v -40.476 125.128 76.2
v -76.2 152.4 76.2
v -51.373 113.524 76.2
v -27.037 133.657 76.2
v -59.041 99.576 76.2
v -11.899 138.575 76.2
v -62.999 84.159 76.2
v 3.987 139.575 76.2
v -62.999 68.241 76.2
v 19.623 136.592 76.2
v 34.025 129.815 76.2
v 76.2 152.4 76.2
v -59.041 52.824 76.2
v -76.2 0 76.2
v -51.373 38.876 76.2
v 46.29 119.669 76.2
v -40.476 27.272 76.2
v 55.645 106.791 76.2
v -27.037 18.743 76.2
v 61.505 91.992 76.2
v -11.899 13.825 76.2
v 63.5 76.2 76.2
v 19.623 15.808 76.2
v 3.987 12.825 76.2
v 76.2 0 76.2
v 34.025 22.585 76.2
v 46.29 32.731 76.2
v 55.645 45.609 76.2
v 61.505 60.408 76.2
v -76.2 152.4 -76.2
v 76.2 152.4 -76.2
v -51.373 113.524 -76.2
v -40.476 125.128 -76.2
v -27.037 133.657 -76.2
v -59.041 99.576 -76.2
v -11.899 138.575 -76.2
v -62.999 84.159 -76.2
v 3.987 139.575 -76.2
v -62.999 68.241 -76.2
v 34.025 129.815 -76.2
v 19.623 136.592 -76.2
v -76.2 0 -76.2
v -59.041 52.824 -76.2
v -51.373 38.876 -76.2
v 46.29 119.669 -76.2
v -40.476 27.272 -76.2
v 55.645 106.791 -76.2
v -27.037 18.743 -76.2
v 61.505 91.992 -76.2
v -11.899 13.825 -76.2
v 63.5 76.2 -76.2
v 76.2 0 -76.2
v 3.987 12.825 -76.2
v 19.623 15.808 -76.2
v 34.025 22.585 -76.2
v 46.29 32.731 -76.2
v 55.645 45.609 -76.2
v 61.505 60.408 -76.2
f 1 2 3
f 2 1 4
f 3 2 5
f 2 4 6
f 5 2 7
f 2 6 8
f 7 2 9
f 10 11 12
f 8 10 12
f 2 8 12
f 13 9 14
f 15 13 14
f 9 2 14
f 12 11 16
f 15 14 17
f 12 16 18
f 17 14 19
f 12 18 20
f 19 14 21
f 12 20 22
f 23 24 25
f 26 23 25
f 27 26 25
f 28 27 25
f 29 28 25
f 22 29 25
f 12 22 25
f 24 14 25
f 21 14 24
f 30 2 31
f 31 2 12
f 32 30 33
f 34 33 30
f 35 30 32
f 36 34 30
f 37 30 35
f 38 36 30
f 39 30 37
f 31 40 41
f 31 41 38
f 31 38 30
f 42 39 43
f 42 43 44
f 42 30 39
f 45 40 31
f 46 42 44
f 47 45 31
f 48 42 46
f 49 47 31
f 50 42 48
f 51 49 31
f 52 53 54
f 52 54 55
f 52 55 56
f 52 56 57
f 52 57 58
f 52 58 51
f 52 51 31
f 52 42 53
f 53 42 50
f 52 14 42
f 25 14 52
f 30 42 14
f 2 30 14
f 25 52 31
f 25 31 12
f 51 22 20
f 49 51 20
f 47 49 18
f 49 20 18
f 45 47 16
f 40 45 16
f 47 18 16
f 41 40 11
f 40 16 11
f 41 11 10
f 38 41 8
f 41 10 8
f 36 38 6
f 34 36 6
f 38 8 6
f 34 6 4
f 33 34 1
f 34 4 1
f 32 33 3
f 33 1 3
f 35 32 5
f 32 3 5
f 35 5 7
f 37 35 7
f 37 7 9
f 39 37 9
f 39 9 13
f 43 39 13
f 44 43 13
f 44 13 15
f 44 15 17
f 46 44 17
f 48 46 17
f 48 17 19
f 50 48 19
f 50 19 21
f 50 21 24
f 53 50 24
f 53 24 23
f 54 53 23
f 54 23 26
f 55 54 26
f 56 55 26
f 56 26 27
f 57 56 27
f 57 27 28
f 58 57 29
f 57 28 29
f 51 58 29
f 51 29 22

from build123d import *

# Parameters (mm, degrees)
F0_W     = 152.4
F0_H     = 152.4
F1_DEPTH = 152.4
F2_R     = 63.5
F3_DEPTH = 152.401


with BuildPart() as f1:
    # F0 (on Front) → F1 (new body)
    with BuildSketch(Plane.XZ):
        Rectangle(F0_W, F0_H)
    extrude(amount=-F1_DEPTH)

    # F2 (on face) → F3 (cut, through all)
    with BuildSketch(Plane.XY.offset(76.2)):
        with Locations((0, 76.2)):
            Circle(F2_R)
    extrude(amount=-F3_DEPTH, mode=Mode.SUBTRACT)


solid = f1.part
